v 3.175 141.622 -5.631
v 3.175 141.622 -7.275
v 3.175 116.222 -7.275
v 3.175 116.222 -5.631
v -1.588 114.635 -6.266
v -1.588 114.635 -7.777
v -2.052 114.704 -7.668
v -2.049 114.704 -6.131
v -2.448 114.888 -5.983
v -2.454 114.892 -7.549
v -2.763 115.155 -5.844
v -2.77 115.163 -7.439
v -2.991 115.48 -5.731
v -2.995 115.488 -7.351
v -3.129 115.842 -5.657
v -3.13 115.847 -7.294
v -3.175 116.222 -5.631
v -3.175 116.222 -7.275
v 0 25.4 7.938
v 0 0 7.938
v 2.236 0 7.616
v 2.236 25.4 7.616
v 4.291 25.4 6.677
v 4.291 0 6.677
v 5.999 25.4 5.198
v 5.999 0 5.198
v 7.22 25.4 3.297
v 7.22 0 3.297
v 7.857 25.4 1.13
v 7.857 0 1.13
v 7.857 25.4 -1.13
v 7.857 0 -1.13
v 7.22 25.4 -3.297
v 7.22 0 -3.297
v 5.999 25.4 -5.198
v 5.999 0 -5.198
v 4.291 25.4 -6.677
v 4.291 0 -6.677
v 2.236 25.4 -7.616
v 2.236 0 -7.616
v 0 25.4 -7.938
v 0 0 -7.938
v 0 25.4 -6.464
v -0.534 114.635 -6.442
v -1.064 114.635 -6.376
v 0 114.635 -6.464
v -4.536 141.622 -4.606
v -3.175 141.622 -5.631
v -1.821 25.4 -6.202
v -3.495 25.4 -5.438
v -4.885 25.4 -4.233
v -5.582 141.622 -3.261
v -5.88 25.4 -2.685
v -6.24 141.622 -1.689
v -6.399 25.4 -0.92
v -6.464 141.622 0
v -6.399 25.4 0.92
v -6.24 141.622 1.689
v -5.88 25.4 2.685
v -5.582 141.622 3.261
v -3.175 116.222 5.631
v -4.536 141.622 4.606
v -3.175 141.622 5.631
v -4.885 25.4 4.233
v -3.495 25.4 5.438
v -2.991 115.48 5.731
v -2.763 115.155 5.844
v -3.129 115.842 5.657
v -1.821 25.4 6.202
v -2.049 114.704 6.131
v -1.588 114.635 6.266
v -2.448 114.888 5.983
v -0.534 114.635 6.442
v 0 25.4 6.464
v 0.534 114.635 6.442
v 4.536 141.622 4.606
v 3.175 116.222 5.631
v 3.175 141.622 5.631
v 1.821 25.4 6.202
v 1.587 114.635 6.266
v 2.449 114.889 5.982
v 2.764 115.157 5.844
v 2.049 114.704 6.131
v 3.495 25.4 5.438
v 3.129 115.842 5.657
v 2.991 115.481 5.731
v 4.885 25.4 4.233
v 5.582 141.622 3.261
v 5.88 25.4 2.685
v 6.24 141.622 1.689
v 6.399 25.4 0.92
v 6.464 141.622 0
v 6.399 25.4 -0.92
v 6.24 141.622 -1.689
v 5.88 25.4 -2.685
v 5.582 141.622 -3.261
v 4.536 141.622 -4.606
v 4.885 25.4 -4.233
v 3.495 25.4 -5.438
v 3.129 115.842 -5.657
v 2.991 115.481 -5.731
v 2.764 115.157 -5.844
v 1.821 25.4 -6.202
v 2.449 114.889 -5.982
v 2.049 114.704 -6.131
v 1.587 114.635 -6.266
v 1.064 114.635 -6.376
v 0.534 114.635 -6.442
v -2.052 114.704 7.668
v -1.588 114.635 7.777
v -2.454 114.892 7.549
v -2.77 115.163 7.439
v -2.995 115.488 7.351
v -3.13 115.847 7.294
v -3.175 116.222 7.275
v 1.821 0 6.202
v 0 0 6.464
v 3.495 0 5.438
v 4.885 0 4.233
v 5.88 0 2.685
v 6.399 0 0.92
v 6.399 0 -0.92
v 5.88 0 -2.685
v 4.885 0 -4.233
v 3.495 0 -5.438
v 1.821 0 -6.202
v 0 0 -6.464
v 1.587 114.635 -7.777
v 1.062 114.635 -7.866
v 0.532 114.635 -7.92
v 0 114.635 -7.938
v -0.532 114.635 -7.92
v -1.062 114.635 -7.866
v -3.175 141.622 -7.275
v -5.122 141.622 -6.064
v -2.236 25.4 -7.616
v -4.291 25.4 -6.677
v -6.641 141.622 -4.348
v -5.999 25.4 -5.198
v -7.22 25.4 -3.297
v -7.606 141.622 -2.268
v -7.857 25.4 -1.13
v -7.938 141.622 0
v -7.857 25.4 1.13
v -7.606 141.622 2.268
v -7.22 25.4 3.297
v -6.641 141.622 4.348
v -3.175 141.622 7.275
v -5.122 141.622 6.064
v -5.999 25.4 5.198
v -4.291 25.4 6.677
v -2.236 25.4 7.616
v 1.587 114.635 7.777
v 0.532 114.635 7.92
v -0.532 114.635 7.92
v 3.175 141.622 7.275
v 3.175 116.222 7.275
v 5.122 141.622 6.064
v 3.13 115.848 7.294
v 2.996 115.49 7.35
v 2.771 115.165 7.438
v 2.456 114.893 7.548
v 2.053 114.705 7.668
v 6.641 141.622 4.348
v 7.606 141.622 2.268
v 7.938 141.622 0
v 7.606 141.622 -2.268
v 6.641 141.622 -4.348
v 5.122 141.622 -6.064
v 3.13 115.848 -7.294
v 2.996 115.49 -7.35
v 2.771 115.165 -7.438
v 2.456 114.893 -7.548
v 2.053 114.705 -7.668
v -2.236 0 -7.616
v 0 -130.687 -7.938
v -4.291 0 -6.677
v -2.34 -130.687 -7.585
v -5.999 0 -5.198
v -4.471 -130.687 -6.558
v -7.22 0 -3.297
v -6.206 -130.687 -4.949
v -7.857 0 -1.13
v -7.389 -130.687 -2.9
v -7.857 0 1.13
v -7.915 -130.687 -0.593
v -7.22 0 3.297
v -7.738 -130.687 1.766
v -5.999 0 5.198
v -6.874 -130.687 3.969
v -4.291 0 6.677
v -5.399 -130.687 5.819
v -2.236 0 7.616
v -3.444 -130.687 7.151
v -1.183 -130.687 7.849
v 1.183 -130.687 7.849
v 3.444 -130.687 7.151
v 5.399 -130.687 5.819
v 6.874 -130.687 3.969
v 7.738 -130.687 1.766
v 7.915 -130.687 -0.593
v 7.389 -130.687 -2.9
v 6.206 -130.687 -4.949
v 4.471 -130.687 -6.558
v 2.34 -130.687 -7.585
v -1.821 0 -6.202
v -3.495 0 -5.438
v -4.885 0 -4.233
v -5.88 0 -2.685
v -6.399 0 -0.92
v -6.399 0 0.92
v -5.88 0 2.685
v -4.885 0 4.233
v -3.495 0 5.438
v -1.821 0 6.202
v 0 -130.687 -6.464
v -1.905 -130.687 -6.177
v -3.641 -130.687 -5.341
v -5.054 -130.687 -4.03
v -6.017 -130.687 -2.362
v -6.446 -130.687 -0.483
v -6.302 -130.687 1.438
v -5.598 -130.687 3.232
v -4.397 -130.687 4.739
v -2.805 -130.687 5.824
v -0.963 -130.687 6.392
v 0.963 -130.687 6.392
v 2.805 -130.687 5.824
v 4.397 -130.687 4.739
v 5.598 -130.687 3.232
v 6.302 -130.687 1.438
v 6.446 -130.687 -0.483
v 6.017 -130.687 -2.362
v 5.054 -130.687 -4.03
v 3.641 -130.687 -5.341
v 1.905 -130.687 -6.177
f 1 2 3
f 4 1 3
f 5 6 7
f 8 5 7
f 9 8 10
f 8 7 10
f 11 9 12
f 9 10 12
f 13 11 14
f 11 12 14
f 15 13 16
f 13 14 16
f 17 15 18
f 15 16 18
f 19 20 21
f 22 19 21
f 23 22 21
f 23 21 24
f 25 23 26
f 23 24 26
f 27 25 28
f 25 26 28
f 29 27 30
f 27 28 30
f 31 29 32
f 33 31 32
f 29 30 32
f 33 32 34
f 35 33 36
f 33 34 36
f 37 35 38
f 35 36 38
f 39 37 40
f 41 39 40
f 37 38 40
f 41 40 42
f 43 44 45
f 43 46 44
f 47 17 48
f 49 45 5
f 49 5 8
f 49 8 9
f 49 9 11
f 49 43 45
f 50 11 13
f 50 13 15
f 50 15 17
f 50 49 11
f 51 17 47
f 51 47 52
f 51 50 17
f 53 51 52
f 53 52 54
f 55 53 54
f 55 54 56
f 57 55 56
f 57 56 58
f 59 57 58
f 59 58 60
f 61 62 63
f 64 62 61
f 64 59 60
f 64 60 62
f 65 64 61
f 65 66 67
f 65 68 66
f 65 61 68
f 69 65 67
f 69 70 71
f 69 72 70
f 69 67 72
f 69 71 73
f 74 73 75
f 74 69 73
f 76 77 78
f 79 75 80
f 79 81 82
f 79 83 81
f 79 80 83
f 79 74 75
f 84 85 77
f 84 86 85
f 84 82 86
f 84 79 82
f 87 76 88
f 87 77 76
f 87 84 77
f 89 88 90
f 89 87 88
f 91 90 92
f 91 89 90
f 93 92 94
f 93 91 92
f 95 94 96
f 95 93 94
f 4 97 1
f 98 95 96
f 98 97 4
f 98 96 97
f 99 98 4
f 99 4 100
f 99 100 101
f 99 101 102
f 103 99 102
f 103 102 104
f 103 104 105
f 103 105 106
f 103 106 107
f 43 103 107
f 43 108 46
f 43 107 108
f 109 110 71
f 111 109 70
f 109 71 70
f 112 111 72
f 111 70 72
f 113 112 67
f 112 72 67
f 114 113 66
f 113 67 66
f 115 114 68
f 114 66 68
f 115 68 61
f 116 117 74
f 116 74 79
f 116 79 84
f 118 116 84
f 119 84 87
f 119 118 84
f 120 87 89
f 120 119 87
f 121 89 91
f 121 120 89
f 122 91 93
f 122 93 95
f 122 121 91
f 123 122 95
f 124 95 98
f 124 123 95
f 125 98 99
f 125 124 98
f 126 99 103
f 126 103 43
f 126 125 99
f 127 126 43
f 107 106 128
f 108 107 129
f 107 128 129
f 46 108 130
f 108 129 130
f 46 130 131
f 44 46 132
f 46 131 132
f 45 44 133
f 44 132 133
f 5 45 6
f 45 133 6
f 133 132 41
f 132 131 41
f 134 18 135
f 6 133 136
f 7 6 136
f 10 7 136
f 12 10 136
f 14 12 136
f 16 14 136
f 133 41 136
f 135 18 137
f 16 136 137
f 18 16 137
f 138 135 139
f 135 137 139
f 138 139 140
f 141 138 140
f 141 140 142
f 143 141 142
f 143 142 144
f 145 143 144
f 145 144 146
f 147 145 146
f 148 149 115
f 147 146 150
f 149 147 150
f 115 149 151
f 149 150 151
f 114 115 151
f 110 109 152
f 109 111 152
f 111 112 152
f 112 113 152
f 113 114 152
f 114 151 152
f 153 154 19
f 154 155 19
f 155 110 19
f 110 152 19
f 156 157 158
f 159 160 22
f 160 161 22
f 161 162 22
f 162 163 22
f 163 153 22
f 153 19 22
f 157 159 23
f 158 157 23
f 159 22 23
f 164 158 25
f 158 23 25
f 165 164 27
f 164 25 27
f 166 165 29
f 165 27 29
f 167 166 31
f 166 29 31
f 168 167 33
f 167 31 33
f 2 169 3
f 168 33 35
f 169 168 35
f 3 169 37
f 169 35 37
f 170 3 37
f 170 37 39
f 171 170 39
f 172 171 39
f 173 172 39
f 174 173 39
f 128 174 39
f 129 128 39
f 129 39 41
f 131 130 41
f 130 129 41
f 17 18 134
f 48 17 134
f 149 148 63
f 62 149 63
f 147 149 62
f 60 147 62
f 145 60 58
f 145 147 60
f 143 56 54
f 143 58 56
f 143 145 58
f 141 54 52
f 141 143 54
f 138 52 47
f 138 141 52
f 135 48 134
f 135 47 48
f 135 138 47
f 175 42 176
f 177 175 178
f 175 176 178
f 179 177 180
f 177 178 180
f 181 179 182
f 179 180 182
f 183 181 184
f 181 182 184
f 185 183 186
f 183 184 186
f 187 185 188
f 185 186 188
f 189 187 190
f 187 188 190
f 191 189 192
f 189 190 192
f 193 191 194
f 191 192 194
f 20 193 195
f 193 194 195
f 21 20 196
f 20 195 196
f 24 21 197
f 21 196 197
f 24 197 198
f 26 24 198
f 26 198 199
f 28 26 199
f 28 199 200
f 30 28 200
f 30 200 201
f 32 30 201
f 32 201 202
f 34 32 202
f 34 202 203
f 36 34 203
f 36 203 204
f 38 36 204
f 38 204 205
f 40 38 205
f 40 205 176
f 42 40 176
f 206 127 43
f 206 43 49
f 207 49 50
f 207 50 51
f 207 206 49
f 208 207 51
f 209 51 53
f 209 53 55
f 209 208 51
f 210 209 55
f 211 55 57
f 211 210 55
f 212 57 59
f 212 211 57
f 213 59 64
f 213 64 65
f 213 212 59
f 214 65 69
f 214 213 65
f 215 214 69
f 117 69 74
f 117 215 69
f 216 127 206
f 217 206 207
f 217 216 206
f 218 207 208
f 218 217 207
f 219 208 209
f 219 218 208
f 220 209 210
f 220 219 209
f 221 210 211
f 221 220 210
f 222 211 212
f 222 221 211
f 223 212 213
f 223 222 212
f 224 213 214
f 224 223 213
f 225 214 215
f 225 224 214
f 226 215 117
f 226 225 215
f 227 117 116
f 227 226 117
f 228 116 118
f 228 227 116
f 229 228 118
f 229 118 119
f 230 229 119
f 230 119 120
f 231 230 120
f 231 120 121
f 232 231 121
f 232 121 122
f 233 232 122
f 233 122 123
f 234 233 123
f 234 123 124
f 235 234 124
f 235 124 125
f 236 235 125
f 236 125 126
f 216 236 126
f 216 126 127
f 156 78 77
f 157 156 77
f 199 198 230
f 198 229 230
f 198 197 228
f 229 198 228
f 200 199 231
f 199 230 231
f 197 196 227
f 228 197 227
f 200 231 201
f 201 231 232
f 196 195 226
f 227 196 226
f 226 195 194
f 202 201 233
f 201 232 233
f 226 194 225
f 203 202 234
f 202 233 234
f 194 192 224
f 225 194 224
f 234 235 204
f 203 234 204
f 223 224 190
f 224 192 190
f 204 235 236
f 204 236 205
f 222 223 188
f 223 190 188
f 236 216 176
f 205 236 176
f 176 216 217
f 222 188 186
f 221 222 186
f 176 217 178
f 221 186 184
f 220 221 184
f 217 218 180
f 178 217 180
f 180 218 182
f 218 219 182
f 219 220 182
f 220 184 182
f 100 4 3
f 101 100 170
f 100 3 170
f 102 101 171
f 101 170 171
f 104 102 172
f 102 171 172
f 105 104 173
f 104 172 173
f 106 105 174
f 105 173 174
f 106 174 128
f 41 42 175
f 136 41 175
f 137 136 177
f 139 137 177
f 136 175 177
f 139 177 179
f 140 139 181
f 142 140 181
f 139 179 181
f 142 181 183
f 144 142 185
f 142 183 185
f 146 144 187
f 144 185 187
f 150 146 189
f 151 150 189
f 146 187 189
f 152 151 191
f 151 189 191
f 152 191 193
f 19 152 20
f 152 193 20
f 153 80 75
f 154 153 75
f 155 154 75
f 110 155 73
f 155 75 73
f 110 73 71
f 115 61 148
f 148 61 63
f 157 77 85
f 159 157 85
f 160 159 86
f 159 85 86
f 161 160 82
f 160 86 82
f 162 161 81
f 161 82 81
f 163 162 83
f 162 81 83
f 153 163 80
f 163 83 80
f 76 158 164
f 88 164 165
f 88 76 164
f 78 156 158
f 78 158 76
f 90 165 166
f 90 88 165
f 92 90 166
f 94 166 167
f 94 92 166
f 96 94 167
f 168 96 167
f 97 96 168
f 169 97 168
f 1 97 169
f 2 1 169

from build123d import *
from build123d.topology import SkipClean

# Parameters (mm, degrees)
SKETCH1_R                = 7.9375
SKETCH1_R_2              = 6.4643
BOSS_EXTRUDE1_DEPTH      = 25.4
BOSS_EXTRUDE2_DEPTH      = 141.62245
BOSS_EXTRUDE2_DEPTH_BACK = 130.68677
SKETCH1_3_R              = 7.9375
SKETCH1_3_R_2            = 6.4643
CUT_EXTRUDE1_DEPTH       = 643.973080375


with BuildPart() as part:
    # Sketch1 → Boss-Extrude1 (new body)
    with BuildSketch(Plane(origin=(0, 0, 0), x_dir=(1, 0, 0), z_dir=(0, 1, 0))):
        with Locations(Location((0, 0, 0), (0, 0, 270))):
            Circle(SKETCH1_R)
        with Locations(Location((0, 0, 0), (0, 0, 270))):
            Circle(SKETCH1_R_2, mode=Mode.SUBTRACT)
    extrude(amount=BOSS_EXTRUDE1_DEPTH)

    # Sketch1<3> → Boss-Extrude2 (add, two sides: drawn at the far end of the back side and taken through both)
    with SkipClean():  # the faces are left unmerged after this step: merging them gives an invalid solid
        with BuildSketch(Plane(origin=(0, 0, 0), x_dir=(1, 0, 0), z_dir=(0, 1, 0)).offset(-BOSS_EXTRUDE2_DEPTH_BACK)):
            with Locations(Location((0, 0, 0), (0, 0, 90))):
                Circle(SKETCH1_3_R)
            with Locations(Location((0, 0, 0), (0, 0, 90))):
                Circle(SKETCH1_3_R_2, mode=Mode.SUBTRACT)
        extrude(amount=BOSS_EXTRUDE2_DEPTH + BOSS_EXTRUDE2_DEPTH_BACK)

    # Sketch4 → Cut-Extrude1 (cut, through all)
    with SkipClean():  # the faces are left unmerged after this step: merging them gives an invalid solid
        with BuildSketch(Plane(origin=(282.84484953, -431.620946529, -7.9375), x_dir=(0.8492193826528428, 0.5280401879845174, 0), z_dir=(0, 0, 1))):
            with BuildLine():
                Line((65.194493974, 634.486323351), (51.782273199, 612.916151031))
                ThreePointArc((51.782273199, 612.916151031), (50.794671358, 612.208396868), (49.595873631, 612.40627906))
                Line((49.595873631, 612.40627906), (46.899602091, 614.082806656))
                ThreePointArc((46.899602091, 614.082806656), (46.191847928, 615.070408498), (46.38973012, 616.269206225))
                Line((46.38973012, 616.269206225), (59.801950894, 637.839378544))
                Line((59.801950894, 637.839378544), (65.194493974, 634.486323351))
            make_face()
        extrude(amount=CUT_EXTRUDE1_DEPTH, mode=Mode.SUBTRACT)


solid = part.part
